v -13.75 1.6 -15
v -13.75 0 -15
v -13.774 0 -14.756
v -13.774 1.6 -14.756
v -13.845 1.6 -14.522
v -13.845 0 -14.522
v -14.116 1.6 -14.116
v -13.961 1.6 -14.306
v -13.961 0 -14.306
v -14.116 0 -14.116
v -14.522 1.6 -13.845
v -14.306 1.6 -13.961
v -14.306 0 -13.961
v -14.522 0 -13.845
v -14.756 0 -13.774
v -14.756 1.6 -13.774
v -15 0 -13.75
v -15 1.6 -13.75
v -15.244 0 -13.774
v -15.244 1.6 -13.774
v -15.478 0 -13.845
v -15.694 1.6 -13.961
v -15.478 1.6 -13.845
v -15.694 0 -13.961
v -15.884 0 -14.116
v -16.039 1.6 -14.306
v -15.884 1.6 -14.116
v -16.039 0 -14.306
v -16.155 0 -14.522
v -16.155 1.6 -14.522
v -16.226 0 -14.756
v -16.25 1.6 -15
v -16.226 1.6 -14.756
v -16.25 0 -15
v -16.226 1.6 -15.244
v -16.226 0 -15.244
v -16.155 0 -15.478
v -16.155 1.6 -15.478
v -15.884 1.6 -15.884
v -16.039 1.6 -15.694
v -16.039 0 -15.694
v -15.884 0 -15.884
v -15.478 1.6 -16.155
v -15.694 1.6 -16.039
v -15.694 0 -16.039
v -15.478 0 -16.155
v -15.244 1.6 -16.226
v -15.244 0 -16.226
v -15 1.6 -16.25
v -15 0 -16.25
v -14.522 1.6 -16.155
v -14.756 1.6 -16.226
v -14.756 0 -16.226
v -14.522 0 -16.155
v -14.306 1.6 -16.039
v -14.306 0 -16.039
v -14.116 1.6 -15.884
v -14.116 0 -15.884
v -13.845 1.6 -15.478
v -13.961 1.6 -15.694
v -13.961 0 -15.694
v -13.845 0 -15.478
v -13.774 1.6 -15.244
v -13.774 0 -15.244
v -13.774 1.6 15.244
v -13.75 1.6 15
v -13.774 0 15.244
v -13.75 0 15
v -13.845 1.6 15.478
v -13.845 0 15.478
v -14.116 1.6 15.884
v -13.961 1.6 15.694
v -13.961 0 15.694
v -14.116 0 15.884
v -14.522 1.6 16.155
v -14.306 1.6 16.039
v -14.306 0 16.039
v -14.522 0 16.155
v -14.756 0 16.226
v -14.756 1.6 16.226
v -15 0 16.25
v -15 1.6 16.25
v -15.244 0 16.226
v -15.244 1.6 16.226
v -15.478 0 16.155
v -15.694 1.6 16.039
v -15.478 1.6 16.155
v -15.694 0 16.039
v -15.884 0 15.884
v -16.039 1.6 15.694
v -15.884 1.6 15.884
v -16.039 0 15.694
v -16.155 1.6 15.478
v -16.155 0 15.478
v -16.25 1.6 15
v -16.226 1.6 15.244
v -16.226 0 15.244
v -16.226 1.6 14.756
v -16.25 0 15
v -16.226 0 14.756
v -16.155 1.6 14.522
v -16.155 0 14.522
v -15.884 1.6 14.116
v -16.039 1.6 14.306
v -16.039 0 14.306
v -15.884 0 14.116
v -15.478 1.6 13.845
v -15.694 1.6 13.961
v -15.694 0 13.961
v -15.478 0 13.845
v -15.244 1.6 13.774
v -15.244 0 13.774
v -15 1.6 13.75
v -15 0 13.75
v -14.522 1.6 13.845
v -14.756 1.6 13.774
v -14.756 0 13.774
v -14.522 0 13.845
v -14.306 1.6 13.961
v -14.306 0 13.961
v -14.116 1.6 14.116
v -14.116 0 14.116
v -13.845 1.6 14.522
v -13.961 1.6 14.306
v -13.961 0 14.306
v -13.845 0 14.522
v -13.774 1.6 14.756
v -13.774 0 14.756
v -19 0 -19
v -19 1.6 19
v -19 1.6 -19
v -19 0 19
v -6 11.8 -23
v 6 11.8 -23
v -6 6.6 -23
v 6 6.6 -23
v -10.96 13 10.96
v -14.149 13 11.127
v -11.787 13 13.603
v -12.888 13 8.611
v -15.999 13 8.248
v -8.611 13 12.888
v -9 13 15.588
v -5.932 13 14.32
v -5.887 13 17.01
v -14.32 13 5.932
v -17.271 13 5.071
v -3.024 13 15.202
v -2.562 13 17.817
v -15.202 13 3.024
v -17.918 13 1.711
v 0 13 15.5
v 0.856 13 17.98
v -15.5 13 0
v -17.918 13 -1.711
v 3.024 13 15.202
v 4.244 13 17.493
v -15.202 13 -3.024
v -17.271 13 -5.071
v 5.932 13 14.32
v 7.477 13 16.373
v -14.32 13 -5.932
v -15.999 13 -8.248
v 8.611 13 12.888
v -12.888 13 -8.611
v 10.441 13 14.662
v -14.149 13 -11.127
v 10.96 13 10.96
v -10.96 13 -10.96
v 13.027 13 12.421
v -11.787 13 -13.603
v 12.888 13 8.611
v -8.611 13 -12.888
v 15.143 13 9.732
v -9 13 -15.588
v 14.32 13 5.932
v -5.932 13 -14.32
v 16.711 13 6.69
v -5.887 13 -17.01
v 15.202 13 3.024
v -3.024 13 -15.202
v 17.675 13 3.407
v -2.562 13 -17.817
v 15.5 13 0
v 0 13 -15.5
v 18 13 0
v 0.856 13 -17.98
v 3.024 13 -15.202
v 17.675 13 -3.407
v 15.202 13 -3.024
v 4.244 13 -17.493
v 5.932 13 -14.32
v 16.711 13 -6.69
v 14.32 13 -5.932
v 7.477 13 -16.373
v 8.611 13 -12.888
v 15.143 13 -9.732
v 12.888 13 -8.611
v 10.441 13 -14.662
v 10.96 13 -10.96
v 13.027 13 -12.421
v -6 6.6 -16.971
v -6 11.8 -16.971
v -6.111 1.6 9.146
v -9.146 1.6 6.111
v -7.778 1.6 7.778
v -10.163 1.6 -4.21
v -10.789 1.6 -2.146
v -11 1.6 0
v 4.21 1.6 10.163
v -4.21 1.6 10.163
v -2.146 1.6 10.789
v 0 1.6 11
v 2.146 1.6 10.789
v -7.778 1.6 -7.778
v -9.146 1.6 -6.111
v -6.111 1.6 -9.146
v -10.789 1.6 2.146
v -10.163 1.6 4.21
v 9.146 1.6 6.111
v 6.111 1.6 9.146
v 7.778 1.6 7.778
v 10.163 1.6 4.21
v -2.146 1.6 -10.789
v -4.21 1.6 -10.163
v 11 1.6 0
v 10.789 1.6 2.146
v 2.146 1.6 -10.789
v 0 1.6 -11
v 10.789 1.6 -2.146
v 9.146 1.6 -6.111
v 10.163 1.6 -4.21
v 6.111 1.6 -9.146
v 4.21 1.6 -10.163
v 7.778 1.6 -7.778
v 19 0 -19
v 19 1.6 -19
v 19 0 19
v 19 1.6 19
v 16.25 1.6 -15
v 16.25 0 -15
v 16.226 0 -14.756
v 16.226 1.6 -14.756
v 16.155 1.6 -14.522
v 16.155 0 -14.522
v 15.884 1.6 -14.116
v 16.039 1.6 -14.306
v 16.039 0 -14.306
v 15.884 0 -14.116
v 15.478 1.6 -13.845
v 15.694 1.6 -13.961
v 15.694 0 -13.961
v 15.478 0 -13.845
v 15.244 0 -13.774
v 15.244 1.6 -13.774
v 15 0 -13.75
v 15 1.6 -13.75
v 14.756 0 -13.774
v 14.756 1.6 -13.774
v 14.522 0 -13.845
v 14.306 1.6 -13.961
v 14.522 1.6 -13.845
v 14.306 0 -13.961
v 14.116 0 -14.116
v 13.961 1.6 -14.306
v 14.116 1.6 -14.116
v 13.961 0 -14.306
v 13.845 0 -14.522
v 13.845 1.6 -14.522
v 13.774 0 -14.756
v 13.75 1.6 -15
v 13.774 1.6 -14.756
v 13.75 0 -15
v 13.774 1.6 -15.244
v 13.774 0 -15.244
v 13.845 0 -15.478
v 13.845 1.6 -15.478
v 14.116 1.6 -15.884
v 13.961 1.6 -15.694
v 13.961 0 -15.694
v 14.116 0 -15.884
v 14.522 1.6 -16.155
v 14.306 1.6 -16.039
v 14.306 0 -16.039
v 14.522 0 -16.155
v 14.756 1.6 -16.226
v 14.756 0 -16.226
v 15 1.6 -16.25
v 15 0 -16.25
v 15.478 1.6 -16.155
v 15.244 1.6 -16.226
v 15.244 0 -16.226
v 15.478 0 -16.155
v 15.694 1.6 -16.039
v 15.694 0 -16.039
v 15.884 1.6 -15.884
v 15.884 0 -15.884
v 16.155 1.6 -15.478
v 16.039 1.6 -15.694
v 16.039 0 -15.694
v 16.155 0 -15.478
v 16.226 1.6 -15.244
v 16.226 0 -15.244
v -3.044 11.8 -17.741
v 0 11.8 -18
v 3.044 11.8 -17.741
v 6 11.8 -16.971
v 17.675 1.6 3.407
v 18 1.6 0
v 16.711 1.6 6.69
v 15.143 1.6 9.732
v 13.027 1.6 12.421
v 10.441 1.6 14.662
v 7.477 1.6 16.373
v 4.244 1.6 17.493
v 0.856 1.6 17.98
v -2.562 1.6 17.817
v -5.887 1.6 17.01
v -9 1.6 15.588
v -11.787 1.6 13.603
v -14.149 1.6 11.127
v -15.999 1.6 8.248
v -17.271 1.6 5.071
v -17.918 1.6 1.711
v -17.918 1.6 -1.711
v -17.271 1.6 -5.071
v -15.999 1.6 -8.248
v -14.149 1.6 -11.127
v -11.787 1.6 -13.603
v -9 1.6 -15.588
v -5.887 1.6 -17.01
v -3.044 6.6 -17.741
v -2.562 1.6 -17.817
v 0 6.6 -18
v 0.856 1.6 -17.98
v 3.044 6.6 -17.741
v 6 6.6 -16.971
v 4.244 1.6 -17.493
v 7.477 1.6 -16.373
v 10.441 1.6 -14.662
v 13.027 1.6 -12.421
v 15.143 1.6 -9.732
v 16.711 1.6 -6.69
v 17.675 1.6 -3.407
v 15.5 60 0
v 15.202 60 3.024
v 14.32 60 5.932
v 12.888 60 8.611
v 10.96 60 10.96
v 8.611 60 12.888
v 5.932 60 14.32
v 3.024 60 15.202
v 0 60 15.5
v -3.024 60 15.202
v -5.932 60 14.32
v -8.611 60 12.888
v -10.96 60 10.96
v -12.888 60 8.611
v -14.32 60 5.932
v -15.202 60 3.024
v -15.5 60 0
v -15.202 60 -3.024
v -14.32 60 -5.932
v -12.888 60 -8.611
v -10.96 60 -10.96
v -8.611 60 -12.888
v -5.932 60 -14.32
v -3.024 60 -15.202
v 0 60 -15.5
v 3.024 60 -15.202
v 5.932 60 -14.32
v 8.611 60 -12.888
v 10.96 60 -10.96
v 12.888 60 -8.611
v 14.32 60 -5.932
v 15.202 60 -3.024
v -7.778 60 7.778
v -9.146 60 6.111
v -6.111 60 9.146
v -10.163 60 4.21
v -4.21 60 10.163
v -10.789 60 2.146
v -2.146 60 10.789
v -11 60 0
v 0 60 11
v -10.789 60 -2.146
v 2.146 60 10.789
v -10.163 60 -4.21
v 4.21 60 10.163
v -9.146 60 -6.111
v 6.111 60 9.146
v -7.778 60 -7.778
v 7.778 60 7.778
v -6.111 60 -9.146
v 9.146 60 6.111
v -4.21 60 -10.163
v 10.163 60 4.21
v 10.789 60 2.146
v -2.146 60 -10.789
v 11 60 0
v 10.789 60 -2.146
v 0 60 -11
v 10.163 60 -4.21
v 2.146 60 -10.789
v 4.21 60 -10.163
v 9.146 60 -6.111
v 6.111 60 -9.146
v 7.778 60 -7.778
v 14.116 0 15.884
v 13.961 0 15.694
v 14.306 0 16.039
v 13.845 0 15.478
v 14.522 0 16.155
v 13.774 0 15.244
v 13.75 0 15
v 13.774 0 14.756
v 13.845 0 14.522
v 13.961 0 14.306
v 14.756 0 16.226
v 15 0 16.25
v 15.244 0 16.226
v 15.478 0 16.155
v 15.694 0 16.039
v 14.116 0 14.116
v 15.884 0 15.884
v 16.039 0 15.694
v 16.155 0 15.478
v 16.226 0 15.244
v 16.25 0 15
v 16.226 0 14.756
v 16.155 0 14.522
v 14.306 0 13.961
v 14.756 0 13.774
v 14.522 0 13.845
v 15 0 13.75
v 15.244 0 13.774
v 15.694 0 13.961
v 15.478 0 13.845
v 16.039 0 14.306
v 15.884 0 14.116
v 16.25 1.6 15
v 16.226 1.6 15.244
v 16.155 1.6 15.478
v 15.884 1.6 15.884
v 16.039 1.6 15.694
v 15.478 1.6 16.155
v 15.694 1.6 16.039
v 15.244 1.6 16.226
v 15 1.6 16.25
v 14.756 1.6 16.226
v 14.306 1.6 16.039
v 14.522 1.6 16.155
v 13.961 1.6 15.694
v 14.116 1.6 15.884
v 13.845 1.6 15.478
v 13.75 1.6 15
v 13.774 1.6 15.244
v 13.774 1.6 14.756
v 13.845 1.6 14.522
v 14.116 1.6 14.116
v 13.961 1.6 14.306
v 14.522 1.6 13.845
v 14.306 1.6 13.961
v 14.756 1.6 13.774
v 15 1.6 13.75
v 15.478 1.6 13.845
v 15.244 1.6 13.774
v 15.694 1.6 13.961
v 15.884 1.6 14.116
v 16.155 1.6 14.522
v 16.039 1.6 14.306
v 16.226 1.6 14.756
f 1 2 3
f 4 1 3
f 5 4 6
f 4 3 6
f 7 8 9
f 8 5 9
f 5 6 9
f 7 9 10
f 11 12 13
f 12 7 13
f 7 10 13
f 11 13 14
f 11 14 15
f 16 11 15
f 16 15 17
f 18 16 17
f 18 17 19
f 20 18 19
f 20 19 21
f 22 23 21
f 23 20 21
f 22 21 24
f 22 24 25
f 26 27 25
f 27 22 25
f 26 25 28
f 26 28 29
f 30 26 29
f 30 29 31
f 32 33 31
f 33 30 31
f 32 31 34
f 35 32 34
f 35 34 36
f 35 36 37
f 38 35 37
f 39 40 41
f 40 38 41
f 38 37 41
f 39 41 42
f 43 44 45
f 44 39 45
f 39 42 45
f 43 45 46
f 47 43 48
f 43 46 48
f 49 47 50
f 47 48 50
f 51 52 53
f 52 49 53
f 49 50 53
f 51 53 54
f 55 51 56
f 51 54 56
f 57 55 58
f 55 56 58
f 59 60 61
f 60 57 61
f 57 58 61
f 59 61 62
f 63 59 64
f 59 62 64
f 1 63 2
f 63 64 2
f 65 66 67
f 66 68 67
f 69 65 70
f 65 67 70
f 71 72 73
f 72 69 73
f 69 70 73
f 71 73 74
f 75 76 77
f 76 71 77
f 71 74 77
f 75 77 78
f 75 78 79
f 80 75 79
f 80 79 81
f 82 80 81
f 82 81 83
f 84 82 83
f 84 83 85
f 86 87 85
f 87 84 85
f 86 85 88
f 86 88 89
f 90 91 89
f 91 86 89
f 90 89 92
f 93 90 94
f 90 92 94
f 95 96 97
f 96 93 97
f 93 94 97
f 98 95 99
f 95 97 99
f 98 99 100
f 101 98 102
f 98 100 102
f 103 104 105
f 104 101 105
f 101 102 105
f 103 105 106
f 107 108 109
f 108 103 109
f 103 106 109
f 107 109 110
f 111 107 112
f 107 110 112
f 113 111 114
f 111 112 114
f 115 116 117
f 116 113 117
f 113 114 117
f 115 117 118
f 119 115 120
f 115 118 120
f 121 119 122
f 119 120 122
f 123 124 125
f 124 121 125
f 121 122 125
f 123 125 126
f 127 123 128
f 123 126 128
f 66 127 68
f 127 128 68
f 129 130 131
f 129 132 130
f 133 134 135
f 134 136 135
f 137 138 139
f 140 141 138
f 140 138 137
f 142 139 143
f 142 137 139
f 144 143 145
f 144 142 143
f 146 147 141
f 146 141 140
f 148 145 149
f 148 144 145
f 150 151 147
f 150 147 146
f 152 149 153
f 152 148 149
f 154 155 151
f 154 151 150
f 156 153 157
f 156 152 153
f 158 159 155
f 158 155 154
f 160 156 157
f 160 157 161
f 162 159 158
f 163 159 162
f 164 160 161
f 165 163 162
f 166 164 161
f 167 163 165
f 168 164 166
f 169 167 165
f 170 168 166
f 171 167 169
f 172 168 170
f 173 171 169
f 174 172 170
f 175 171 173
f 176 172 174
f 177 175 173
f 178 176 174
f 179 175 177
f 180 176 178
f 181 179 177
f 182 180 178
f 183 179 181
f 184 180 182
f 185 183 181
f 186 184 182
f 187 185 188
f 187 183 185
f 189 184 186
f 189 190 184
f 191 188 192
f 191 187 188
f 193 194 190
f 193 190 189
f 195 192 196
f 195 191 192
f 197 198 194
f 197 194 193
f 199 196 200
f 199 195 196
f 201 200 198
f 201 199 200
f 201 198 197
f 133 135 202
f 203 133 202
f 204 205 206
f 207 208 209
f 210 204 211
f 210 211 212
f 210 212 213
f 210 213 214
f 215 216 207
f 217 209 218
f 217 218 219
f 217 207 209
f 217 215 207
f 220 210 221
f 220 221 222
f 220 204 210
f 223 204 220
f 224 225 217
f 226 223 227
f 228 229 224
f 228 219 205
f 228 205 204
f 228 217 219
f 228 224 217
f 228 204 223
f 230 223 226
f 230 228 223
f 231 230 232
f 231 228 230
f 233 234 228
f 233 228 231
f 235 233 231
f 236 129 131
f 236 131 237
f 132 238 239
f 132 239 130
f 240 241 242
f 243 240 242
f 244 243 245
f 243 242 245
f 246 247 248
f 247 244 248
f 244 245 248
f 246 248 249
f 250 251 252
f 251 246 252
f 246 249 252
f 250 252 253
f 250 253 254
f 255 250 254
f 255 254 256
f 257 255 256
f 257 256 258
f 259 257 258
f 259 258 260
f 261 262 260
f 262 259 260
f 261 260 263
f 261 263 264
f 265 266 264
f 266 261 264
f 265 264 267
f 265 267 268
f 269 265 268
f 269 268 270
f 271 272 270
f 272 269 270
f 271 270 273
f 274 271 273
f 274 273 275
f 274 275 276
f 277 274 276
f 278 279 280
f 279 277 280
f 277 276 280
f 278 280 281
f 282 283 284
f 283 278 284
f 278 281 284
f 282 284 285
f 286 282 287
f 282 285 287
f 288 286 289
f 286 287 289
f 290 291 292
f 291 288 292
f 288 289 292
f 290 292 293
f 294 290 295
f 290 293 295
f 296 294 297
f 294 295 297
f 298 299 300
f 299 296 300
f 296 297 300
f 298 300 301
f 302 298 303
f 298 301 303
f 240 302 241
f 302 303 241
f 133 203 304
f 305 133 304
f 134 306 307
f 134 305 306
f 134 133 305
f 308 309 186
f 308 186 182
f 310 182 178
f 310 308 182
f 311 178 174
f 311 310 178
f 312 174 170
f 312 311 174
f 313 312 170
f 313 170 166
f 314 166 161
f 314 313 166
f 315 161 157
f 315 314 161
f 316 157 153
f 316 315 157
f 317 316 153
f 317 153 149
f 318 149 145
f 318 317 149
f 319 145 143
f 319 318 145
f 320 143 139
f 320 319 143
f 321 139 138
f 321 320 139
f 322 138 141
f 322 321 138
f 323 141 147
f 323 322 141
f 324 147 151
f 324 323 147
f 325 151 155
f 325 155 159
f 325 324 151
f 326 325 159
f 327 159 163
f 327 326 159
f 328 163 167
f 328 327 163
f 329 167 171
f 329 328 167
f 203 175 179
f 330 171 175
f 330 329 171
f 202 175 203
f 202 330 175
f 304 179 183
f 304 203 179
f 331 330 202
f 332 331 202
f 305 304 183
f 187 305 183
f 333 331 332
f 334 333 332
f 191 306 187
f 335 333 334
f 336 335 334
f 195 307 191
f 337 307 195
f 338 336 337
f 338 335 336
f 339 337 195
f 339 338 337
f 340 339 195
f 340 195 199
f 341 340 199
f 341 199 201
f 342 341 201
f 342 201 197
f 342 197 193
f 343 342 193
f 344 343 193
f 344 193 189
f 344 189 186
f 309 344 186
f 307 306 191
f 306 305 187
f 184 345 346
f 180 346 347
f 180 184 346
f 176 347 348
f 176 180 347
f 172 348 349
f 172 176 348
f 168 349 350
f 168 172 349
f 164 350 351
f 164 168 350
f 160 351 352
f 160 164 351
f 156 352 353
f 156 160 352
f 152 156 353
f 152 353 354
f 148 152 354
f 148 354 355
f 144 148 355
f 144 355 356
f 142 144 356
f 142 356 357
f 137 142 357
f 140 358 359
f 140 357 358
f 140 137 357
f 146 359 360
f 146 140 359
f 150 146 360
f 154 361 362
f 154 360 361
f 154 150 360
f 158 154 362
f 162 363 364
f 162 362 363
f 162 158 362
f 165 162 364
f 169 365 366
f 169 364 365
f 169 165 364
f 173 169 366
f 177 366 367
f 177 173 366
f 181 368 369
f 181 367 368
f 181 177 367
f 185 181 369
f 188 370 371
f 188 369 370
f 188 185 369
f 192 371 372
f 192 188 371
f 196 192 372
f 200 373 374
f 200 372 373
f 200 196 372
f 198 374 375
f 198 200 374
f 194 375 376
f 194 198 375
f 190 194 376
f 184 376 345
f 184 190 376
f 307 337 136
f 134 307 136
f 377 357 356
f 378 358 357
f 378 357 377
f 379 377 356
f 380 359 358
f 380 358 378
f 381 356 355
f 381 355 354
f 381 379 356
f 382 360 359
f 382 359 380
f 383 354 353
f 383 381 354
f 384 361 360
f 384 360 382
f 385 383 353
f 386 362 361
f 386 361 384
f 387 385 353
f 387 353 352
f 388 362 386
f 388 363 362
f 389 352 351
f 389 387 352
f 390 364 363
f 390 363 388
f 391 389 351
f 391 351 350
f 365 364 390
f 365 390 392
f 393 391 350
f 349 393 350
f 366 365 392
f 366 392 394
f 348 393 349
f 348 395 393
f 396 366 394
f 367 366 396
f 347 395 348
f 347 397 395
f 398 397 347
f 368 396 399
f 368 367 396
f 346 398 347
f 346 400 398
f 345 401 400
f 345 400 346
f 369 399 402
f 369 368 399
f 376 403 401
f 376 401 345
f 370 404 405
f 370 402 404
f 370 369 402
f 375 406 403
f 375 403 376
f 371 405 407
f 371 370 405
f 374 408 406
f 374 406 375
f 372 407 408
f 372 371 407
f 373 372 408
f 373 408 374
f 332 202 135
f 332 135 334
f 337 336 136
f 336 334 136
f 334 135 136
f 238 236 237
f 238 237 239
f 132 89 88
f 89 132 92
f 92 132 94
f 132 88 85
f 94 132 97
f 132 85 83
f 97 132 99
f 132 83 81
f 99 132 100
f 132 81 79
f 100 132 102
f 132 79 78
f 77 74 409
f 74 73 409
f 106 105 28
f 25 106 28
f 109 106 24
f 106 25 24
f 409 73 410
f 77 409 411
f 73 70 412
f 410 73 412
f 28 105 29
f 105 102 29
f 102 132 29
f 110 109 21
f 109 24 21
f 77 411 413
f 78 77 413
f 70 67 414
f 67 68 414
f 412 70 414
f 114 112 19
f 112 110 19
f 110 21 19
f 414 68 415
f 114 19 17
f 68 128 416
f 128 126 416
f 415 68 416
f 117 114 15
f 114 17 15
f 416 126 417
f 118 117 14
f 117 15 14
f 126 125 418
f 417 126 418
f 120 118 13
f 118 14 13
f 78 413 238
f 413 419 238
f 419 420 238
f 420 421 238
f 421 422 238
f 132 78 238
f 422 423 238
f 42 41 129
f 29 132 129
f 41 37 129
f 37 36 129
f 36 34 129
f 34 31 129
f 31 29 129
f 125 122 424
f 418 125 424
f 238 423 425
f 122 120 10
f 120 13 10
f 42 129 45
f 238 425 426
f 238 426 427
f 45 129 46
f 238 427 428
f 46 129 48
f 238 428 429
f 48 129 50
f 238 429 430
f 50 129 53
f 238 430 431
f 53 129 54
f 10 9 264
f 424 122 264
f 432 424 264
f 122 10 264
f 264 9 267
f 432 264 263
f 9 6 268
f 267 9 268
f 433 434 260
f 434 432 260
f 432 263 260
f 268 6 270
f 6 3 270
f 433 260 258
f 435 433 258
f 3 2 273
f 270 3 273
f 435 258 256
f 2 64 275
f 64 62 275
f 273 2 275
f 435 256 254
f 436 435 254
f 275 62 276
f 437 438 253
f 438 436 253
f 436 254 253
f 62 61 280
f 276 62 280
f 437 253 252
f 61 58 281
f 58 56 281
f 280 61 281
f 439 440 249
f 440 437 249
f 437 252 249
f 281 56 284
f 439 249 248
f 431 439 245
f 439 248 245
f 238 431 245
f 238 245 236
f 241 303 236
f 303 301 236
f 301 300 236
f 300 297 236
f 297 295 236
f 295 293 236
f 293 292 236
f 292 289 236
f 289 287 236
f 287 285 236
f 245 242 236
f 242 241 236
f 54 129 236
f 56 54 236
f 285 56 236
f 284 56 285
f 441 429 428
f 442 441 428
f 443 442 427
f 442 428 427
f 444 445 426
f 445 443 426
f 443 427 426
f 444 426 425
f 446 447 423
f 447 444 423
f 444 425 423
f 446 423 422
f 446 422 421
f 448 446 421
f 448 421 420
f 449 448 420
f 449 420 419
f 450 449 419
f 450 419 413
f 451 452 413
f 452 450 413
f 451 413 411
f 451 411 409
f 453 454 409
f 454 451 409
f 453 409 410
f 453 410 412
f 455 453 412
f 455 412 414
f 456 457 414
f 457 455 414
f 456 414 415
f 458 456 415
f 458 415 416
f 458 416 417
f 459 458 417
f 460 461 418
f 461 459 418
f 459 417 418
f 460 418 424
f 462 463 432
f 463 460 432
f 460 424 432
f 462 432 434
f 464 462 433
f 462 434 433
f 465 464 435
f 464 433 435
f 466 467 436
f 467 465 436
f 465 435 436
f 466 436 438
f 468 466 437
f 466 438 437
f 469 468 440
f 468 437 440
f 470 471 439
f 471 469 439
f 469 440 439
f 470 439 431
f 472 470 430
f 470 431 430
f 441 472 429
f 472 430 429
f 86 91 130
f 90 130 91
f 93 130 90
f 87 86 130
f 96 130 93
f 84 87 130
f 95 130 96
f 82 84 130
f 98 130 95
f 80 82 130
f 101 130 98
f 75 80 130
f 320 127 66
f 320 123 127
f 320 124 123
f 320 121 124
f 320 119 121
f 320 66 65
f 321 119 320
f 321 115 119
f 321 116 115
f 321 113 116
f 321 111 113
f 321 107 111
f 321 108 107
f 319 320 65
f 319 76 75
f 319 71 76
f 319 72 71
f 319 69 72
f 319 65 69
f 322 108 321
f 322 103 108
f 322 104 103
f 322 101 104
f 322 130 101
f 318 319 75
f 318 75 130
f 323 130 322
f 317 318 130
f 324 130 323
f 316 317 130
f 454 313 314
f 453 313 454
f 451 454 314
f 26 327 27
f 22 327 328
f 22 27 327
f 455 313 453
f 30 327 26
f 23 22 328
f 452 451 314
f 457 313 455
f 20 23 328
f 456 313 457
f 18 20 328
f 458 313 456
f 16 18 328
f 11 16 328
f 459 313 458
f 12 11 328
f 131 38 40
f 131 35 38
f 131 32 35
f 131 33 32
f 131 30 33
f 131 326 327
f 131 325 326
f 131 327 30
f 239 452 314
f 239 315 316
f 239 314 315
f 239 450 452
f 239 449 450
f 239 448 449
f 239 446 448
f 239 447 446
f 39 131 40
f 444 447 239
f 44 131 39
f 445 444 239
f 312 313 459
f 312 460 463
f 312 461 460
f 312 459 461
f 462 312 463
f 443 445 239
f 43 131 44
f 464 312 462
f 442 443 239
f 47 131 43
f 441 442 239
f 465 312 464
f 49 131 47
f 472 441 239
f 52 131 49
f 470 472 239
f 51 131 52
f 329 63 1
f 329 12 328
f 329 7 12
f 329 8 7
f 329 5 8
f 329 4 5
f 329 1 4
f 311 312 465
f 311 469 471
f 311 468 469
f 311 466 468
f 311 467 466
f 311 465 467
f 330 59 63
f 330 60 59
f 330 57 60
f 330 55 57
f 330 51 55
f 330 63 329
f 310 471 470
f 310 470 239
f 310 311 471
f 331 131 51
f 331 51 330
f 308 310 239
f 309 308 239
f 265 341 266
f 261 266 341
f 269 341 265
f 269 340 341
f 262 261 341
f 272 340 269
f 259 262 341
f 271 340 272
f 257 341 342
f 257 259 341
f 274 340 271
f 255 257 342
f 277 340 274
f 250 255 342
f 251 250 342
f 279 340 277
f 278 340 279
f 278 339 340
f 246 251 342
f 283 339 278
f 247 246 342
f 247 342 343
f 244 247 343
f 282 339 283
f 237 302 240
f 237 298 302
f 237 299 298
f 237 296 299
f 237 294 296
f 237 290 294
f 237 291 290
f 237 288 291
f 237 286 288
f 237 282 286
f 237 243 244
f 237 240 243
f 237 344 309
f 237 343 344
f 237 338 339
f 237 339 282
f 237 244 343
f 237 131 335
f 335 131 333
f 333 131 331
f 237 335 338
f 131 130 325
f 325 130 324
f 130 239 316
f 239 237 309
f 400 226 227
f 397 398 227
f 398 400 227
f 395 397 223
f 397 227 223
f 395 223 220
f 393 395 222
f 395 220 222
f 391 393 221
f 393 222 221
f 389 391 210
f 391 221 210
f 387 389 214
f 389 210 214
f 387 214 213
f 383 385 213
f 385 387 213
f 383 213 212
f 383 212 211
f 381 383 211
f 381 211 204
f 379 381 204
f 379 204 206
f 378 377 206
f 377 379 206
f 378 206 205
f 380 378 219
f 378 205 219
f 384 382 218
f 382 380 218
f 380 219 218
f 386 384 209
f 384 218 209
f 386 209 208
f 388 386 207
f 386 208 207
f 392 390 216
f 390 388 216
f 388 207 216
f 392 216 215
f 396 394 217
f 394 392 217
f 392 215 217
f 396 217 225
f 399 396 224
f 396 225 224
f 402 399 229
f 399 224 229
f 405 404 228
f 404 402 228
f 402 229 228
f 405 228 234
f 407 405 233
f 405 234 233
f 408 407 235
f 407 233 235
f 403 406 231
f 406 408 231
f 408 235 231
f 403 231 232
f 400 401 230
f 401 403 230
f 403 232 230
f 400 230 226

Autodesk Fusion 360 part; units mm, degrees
sketch "camera_dimensions" plane through (0, 0, 0) normal (0, 1, 0) x (1, 0, 0)
  line L0 (19, -19) -> (-19, -19)
  line L1 (-19, -19) -> (-19, 19)
  line L2 (-19, 19) -> (19, 19)
  line L3 (19, 19) -> (19, -19)
  line L4 (19, -19) -> (-19, 19) construction
  line L5 (-19, -19) -> (19, 19) construction
  circle A0 centre (-15, 15) radius 1.25
  circle A1 centre (15, 15) radius 1.25
  circle A2 centre (-15, -15) radius 1.25
  circle A3 centre (15, -15) radius 1.25
  circle A4 centre (0, 0) radius 18
  circle A5 centre (0, 0) radius 15.5
  circle A6 centre (0, 0) radius 11
  line L6 (-6, 16) -> (6, 16)
  line L7 (6, 16) -> (6, 23)
  line L8 (6, 23) -> (-6, 23)
  line L9 (-6, 23) -> (-6, 16)
  line L10 (0, 30) -> (0, -25) construction
  dimension "d1" = 38
  dimension "d2" = 38
  dimension "d3" = 2.5
  dimension "d4" = 4
  dimension "d5" = 4
  dimension "d6" = 2.5
  dimension "d7" = 2.5
  dimension "d8" = 2.5
  dimension "d9" = 4
  dimension "d10" = 4
  dimension "d11" = 4
  dimension "d12" = 4
  dimension "d13" = 4
  dimension "d14" = 4
  dimension "d15" = 36
  dimension "d16" = 31
  dimension "d17" = 22
  dimension "d18" = 12
extrude "Extrude1" add sketch "camera_dimensions" along normal blind 1.6 contours L0 L1 L2 L3 A4 L7 L9 | L2 A4 L7 L9 | A4 L6 L7 L9 | A4 L6 L7 L9 | A5 | A6
extrude "Extrude2" add sketch "camera_dimensions" along normal blind 11.4 from surface at 1.6 contours A4 L6 L7 L9 | A4 L6 L7 L9 | A5
extrude "Extrude3" add sketch "camera_dimensions" along normal blind 60 contours A5
extrude "Extrude4" add sketch "camera_dimensions" along normal blind 5.2 from surface at 6.6 contours L2 A4 L7 L9 | L2 L7 L8 L9
